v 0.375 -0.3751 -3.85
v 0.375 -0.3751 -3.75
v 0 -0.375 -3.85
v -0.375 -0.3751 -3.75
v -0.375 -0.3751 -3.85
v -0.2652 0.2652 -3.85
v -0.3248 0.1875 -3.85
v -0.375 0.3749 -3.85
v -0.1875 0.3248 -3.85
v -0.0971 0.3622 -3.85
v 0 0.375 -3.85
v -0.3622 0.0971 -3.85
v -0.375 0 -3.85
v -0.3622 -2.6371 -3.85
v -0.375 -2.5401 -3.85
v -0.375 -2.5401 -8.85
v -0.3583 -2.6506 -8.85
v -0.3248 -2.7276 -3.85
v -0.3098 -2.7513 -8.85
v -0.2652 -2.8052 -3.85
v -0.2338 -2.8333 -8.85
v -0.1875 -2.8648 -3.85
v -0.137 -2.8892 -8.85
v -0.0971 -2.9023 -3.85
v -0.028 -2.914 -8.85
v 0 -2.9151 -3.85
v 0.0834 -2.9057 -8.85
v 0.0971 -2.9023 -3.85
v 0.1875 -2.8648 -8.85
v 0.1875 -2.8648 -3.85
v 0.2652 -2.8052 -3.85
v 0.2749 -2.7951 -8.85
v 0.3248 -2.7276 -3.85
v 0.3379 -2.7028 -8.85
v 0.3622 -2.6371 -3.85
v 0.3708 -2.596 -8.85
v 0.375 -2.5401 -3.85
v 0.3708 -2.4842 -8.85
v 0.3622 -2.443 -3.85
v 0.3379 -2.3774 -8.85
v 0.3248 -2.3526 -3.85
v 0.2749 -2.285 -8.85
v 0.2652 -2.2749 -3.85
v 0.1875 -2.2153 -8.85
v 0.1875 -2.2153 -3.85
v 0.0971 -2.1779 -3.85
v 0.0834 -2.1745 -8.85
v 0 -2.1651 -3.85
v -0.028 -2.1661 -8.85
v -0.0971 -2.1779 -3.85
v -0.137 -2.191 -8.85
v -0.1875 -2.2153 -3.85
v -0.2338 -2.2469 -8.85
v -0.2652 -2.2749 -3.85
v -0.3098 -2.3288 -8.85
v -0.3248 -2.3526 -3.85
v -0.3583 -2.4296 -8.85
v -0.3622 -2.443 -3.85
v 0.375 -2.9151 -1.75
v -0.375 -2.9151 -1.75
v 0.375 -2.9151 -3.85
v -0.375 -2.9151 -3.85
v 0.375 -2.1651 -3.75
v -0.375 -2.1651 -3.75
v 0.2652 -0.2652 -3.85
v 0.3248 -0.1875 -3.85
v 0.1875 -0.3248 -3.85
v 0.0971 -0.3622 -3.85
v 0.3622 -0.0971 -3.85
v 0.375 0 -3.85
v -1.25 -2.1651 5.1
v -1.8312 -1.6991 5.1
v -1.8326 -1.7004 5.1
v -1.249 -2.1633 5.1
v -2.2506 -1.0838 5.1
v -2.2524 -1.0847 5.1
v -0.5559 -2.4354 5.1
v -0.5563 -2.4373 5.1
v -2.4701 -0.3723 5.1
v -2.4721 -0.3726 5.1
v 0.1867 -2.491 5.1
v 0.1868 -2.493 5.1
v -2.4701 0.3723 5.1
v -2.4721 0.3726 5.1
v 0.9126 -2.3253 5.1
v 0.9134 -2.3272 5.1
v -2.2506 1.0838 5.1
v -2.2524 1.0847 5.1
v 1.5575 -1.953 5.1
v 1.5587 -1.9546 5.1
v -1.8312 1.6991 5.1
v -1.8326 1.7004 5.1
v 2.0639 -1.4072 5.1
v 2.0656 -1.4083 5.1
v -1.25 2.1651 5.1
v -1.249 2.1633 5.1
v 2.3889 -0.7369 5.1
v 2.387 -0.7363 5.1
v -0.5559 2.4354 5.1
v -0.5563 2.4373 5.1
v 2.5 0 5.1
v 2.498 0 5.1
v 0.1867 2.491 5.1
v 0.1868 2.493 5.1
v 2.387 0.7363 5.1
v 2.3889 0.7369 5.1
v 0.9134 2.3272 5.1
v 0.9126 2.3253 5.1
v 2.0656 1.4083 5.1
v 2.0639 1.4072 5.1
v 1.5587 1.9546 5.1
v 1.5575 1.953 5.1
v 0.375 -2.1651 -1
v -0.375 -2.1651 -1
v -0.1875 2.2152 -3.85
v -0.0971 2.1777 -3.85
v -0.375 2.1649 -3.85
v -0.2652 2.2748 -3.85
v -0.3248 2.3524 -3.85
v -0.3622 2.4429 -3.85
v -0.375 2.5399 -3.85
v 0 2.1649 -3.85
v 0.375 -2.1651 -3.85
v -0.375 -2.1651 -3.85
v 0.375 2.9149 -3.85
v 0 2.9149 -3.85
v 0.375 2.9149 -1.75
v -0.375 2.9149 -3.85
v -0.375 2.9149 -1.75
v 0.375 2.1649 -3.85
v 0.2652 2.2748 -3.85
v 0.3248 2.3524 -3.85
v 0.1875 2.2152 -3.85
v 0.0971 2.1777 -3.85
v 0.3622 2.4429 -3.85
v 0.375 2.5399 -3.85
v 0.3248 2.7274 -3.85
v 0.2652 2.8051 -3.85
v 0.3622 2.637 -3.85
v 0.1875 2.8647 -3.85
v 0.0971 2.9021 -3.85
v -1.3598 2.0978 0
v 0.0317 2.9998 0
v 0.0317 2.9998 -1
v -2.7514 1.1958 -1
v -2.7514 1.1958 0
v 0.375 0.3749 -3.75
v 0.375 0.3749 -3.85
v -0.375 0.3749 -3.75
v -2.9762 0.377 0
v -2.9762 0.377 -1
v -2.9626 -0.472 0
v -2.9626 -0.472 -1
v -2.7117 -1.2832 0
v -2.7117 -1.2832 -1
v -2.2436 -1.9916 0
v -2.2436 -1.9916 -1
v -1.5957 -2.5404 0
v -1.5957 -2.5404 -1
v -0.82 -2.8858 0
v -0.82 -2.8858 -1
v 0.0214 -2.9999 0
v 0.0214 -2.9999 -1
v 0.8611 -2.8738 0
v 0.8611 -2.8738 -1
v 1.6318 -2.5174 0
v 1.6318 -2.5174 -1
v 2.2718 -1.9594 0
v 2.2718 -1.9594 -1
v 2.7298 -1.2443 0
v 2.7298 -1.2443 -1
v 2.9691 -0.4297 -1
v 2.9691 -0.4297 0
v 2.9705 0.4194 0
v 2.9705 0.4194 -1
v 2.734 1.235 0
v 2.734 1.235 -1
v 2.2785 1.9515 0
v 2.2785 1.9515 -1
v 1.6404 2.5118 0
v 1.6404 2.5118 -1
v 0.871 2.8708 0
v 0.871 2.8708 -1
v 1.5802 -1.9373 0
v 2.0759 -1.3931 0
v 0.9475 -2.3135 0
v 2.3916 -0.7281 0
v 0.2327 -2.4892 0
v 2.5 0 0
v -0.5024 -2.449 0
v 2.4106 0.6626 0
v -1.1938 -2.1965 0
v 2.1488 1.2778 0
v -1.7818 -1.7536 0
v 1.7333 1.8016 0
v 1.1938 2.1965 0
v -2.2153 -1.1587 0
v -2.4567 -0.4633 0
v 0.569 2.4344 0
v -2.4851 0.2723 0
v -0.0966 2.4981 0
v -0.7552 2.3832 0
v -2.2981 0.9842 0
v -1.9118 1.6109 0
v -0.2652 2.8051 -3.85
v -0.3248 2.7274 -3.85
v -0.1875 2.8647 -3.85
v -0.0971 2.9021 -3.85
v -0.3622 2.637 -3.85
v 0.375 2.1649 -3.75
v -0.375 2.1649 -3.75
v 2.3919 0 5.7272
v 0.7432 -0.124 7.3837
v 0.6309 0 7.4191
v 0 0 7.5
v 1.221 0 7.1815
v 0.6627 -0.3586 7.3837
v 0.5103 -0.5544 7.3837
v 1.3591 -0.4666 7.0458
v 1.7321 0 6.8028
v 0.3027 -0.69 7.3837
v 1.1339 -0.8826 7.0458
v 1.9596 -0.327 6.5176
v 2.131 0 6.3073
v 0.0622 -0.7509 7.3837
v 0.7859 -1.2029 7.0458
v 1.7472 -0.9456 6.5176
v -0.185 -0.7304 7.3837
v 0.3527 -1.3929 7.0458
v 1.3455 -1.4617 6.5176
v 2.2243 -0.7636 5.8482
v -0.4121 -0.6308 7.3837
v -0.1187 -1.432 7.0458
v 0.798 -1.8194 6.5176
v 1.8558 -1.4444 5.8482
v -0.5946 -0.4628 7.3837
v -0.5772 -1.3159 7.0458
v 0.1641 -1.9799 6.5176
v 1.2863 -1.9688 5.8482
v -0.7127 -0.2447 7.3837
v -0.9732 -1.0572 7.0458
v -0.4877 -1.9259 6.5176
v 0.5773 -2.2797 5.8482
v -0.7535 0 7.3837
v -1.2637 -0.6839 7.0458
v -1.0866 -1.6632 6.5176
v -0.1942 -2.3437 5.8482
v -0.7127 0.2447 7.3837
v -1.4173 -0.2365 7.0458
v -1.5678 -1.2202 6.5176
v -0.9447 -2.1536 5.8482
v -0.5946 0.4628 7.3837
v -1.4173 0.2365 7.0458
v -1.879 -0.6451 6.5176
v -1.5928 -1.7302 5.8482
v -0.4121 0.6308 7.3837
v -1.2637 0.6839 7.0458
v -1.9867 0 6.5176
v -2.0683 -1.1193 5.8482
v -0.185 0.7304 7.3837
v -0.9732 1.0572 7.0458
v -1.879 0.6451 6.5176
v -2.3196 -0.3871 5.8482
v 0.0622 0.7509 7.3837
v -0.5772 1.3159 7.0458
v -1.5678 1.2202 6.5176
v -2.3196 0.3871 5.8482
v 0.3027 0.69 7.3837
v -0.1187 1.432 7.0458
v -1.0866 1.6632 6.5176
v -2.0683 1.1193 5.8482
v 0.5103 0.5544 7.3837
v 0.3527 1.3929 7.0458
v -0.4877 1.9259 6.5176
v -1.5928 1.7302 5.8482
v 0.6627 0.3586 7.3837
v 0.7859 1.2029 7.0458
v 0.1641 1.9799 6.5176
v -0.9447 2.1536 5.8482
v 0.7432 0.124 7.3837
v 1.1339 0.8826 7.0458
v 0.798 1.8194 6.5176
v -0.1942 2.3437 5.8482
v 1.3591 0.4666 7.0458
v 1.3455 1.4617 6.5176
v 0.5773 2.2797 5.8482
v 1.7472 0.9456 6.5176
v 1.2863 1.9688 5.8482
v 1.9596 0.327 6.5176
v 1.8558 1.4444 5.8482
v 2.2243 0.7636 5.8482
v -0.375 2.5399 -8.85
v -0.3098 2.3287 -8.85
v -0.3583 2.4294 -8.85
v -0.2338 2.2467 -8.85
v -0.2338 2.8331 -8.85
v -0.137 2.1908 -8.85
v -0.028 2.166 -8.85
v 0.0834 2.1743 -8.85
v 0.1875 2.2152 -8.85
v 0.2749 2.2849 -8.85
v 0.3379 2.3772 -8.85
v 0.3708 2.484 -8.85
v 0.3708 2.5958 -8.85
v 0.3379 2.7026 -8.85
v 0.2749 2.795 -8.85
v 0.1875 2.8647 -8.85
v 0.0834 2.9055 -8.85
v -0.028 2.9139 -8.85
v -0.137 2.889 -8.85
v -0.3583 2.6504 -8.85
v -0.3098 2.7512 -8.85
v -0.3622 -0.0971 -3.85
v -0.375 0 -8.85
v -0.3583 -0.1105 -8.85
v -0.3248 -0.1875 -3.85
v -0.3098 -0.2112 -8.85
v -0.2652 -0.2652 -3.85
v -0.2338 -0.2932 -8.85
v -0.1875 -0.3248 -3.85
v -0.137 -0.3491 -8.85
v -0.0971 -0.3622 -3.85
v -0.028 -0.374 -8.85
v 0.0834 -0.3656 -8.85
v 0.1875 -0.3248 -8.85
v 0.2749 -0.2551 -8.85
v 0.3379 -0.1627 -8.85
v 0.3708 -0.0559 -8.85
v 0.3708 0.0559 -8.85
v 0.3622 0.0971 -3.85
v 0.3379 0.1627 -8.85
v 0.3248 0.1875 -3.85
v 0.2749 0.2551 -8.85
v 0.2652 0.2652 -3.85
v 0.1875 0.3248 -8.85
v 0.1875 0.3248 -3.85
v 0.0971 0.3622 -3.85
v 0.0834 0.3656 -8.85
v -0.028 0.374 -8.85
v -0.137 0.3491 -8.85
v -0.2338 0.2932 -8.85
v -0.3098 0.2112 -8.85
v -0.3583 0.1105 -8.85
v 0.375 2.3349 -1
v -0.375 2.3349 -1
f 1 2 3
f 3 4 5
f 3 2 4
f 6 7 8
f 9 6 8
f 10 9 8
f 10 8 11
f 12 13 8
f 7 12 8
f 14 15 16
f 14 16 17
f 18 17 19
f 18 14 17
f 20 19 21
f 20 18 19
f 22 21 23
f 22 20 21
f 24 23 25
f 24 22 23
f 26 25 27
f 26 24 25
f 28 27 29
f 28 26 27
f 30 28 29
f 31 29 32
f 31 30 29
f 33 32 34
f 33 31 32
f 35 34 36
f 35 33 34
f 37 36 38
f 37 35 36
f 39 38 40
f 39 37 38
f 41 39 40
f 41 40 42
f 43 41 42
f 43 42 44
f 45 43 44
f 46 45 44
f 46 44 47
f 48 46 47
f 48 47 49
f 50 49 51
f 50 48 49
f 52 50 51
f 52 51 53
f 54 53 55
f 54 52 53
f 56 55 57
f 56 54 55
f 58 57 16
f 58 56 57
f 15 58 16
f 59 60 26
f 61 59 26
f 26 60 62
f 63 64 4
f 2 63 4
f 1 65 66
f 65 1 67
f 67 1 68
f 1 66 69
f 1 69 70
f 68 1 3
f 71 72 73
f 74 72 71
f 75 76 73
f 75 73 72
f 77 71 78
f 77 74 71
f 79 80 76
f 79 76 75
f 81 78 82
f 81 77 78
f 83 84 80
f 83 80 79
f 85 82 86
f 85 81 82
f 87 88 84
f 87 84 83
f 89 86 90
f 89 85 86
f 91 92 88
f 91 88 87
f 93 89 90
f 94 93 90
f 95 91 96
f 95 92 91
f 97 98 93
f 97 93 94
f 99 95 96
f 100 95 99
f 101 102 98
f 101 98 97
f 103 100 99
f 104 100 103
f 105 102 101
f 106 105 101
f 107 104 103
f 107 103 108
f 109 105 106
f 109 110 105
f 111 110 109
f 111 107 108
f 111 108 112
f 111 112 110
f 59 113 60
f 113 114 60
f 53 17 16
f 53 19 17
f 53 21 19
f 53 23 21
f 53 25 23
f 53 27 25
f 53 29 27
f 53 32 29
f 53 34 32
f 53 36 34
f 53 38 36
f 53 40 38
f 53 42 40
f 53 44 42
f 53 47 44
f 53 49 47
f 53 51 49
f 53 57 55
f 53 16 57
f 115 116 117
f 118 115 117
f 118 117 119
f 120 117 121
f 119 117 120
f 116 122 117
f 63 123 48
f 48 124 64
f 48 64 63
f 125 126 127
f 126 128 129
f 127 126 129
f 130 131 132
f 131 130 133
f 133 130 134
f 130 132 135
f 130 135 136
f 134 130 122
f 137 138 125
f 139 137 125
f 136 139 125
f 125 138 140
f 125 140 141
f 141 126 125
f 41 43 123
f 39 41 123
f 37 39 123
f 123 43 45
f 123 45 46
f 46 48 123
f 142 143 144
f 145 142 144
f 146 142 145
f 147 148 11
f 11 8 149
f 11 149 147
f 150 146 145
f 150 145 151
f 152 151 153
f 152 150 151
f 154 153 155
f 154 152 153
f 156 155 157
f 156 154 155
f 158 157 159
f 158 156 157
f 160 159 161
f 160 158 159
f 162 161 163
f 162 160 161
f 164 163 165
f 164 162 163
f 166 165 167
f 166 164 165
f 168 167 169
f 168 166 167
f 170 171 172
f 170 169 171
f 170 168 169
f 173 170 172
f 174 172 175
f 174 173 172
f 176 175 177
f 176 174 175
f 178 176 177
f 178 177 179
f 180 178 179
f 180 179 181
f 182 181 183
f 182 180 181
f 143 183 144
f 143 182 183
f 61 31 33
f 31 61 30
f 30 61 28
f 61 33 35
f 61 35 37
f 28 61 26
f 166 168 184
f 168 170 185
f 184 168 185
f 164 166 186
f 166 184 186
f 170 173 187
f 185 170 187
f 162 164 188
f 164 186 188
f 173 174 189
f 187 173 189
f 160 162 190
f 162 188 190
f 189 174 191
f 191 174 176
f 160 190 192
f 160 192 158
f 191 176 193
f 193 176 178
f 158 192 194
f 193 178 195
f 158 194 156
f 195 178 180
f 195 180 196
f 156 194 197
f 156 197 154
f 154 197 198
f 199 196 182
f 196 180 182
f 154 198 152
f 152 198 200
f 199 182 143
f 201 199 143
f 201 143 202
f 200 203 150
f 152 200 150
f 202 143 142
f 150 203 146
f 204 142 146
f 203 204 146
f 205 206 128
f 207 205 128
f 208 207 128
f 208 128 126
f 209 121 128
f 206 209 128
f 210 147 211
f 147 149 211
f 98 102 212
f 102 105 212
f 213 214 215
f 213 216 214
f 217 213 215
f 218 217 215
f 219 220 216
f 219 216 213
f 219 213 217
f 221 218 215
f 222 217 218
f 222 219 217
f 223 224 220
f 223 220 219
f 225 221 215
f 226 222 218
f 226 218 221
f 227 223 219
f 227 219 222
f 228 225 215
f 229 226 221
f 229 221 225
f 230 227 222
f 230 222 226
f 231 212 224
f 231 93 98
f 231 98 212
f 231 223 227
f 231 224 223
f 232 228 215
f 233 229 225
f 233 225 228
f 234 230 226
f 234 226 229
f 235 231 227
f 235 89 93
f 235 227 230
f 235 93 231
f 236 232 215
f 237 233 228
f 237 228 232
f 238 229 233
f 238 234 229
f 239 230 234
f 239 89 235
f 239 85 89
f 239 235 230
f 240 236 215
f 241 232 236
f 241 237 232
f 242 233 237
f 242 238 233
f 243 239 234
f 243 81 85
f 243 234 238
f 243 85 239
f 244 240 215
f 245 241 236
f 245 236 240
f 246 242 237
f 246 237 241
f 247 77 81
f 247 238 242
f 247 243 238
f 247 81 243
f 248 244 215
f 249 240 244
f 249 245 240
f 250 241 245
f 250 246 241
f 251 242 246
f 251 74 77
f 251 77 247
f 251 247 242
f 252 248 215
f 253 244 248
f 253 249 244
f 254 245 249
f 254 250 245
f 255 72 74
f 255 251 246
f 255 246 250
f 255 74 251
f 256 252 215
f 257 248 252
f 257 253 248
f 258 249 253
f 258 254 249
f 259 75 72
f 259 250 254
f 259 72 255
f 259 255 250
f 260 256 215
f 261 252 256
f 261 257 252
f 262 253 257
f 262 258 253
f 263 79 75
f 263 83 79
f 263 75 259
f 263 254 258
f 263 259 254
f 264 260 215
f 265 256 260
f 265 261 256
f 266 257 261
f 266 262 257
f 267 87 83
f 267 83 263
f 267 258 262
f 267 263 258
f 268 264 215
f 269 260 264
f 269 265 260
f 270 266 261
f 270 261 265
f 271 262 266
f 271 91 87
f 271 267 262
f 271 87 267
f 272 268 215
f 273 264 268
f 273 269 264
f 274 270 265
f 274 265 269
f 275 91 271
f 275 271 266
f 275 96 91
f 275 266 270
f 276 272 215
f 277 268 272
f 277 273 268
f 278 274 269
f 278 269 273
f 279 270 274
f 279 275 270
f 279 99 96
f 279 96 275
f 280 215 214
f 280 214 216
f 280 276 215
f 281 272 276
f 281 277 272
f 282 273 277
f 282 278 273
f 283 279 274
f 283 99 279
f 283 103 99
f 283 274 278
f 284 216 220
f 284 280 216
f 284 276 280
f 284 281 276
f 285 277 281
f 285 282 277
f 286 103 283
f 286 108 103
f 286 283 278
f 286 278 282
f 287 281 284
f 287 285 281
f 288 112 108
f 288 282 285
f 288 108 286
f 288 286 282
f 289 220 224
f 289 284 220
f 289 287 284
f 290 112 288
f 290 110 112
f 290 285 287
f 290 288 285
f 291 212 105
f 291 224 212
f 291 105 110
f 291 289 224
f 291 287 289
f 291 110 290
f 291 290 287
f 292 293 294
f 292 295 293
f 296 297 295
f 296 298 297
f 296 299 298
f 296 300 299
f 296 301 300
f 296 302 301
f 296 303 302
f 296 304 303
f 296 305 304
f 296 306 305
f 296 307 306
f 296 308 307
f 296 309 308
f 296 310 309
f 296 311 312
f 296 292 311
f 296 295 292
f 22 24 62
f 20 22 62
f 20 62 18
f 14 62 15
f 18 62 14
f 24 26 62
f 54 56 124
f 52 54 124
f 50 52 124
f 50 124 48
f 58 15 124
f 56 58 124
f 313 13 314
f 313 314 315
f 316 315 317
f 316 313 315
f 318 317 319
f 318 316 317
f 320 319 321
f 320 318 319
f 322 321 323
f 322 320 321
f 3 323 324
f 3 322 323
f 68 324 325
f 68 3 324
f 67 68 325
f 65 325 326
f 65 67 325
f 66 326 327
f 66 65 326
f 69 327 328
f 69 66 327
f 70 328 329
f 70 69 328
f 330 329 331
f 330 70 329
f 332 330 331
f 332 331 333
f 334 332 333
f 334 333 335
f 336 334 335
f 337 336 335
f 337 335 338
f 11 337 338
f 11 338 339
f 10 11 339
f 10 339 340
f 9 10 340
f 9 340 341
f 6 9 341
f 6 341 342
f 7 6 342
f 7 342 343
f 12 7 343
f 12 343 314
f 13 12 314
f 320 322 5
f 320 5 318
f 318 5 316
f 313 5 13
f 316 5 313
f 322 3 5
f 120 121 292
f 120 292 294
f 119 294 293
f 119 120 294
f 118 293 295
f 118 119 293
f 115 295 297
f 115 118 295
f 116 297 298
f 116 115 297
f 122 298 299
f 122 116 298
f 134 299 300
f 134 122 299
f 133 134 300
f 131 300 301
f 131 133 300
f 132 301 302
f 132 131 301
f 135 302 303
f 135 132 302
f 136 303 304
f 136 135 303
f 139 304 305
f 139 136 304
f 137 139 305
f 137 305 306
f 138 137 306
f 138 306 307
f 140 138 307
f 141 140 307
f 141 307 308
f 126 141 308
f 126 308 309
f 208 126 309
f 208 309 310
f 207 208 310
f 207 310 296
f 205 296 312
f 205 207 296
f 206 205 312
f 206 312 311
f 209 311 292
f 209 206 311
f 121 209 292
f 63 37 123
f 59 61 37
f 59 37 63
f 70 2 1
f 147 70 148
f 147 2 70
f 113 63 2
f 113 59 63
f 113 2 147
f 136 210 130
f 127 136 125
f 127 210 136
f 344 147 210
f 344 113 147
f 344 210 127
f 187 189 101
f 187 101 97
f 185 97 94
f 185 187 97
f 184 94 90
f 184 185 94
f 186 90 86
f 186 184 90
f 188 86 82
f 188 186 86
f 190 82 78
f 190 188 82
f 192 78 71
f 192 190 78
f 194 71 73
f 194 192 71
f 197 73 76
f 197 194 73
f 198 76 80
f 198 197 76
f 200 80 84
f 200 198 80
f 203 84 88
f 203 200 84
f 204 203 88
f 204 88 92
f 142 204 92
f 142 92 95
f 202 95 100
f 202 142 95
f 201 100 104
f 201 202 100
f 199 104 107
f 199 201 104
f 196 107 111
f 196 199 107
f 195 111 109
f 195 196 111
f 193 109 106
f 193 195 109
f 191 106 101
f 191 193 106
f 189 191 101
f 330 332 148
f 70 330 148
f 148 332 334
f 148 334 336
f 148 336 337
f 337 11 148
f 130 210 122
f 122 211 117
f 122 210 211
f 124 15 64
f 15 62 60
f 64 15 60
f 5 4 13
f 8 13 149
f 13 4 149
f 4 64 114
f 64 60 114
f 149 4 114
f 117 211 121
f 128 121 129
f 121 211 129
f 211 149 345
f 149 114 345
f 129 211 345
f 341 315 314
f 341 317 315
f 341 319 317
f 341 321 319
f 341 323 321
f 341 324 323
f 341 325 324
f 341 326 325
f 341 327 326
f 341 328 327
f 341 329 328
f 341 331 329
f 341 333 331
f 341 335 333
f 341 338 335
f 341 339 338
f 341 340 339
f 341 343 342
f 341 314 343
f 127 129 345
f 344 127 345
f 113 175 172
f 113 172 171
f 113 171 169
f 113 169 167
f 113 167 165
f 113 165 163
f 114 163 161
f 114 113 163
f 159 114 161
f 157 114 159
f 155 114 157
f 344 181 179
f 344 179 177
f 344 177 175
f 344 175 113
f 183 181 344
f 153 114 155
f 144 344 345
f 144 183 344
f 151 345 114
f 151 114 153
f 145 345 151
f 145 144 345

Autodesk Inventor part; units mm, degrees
ref_plane "YZ Plane" through (0, 0, 0) normal (1, 0, 0) x (0, 1, 0)
ref_plane "XZ Plane" through (0, 0, 0) normal (0, 1, 0) x (-1, 0, 0)
ref_plane "XY Plane" through (0, 0, 0) normal (0, 0, 1) x (1, 0, 0)
sketch "Sketch1" plane through (0, 0, 0) normal (0, 0, 1) x (1, 0, 0)
  circle A0 centre (0, 0) radius 2.5
  dimension "d0" = 5
extrude "Extrusion1" add sketch "Sketch1" along normal blind 5.1
sketch "Sketch2" plane through (0, 0, 0) normal (0, 0, -1) x (-1, 0, 0)
  circle A0 centre (0, 0) radius 2.5
  arc A1 (-0.031716, 2.999832) -> (2.751366, 1.195821) centre (0, 0) ccw
  line L0 (-0.031716, 2.999832) -> (2.751366, 1.195821)
  dimension "d3" = 6
extrude "Extrusion2" add sketch "Sketch2" along normal blind 1 contours A0 | L0 A1
sketch "Sketch4" plane through (0, 0, 0) normal (0, 1, 0) x (-1, 0, 0)
  line L0 (0, 0) -> (0, 10.583317)
  arc A0 (0, 7.5) -> (-2.5, 5) centre (0, 5) ccw
  line L1 (-2.5, 5) -> (0, 5)
  dimension "d11" = 2.5
  dimension "d12" = 5
revolve "Revolution1" add sketch "Sketch4" angle 360 about axis through (0, 0, 0) along (0, 0, 1)
sketch "Sketch5" plane through (0, 0, 0) normal (1, 0, 0) x (0, 1, 0)
  line L0 (-2.165084, -1) -> (-2.915084, -1.75)
  line L1 (-2.915084, -1.75) -> (-2.915084, -3.85)
  line L2 (-2.915084, -3.85) -> (-2.165084, -3.85)
  line L3 (-2.165084, -3.85) -> (-2.165084, -3.75)
  line L4 (-2.165084, -3.75) -> (-0.375084, -3.75)
  line L5 (-0.375084, -3.75) -> (-0.375084, -3.85)
  line L6 (-0.375084, -3.85) -> (0.374916, -3.85)
  line L7 (0.374916, -3.85) -> (0.374916, -3.75)
  line L8 (0.374916, -3.75) -> (2.164916, -3.75)
  line L9 (2.164916, -3.75) -> (2.164916, -3.85)
  line L10 (2.164916, -3.85) -> (2.914916, -3.85)
  line L11 (2.914916, -3.85) -> (2.914916, -1.75)
  line L12 (2.914916, -1.75) -> (2.334916, -1)
  line L13 (2.334916, -1) -> (-2.165084, -1)
  line L14 (2.999832, -1) -> (-3, -1)
  line L15 (-0.000084, -1) -> (-0.000084, -3.532862)
  point P0 (0, 0)
  point P1 (1.195821, -1)
  dimension "d14" = 0.75
  dimension "d15" = 0.75
  dimension "d16" = 0.75
  dimension "d17" = 2.54
  dimension "d18" = 2.54
  dimension "d19" = 2.75
  dimension "d20" = 4.5
  dimension "d21" = 0.75
  dimension "d22" = 0.75
  dimension "d23" = 0.1
  dimension "d24" = 0
  dimension "d25" = 0.375
extrude "Extrusion3" add sketch "Sketch5" along normal mid plane 0.75
sketch "Sketch6" plane through (0.375, -0.375084, -3.85) normal (0, 0, -1) x (-1, 0, 0)
  line L0 (0, 0) -> (0.75, 0.75)
  line L1 (0.75, 0) -> (0, 0.75)
  circle A0 centre (0.375, 0.375084) radius 0.375
  point P0 (0.375, 0.375084)
sketch "Sketch7" plane through (0.375, 2.164916, -3.85) normal (0, 0, -1) x (-1, 0, 0)
  line L0 (0, 0.75) -> (0.75, 0)
  line L1 (0.75, 0.75) -> (0, 0)
  circle A0 centre (0.375, 0.375) radius 0.375
  point P0 (0.375, -2.164916)
sketch "Sketch8" plane through (0.375, -2.915084, -3.85) normal (0, 0, -1) x (-1, 0, 0)
  line L0 (0, 0.75) -> (0.75, 0)
  line L1 (0.75, 0.75) -> (0, 0)
  circle A0 centre (0.375, 0.375) radius 0.375
  point P0 (0.375, 2.915084)
extrude "Extrusion4" add sketch "Sketch8" along normal blind 5
extrude "Extrusion5" add sketch "Sketch6" along normal blind 5
extrude "Extrusion6" add sketch "Sketch7" along normal blind 5
properties part number "LED"
